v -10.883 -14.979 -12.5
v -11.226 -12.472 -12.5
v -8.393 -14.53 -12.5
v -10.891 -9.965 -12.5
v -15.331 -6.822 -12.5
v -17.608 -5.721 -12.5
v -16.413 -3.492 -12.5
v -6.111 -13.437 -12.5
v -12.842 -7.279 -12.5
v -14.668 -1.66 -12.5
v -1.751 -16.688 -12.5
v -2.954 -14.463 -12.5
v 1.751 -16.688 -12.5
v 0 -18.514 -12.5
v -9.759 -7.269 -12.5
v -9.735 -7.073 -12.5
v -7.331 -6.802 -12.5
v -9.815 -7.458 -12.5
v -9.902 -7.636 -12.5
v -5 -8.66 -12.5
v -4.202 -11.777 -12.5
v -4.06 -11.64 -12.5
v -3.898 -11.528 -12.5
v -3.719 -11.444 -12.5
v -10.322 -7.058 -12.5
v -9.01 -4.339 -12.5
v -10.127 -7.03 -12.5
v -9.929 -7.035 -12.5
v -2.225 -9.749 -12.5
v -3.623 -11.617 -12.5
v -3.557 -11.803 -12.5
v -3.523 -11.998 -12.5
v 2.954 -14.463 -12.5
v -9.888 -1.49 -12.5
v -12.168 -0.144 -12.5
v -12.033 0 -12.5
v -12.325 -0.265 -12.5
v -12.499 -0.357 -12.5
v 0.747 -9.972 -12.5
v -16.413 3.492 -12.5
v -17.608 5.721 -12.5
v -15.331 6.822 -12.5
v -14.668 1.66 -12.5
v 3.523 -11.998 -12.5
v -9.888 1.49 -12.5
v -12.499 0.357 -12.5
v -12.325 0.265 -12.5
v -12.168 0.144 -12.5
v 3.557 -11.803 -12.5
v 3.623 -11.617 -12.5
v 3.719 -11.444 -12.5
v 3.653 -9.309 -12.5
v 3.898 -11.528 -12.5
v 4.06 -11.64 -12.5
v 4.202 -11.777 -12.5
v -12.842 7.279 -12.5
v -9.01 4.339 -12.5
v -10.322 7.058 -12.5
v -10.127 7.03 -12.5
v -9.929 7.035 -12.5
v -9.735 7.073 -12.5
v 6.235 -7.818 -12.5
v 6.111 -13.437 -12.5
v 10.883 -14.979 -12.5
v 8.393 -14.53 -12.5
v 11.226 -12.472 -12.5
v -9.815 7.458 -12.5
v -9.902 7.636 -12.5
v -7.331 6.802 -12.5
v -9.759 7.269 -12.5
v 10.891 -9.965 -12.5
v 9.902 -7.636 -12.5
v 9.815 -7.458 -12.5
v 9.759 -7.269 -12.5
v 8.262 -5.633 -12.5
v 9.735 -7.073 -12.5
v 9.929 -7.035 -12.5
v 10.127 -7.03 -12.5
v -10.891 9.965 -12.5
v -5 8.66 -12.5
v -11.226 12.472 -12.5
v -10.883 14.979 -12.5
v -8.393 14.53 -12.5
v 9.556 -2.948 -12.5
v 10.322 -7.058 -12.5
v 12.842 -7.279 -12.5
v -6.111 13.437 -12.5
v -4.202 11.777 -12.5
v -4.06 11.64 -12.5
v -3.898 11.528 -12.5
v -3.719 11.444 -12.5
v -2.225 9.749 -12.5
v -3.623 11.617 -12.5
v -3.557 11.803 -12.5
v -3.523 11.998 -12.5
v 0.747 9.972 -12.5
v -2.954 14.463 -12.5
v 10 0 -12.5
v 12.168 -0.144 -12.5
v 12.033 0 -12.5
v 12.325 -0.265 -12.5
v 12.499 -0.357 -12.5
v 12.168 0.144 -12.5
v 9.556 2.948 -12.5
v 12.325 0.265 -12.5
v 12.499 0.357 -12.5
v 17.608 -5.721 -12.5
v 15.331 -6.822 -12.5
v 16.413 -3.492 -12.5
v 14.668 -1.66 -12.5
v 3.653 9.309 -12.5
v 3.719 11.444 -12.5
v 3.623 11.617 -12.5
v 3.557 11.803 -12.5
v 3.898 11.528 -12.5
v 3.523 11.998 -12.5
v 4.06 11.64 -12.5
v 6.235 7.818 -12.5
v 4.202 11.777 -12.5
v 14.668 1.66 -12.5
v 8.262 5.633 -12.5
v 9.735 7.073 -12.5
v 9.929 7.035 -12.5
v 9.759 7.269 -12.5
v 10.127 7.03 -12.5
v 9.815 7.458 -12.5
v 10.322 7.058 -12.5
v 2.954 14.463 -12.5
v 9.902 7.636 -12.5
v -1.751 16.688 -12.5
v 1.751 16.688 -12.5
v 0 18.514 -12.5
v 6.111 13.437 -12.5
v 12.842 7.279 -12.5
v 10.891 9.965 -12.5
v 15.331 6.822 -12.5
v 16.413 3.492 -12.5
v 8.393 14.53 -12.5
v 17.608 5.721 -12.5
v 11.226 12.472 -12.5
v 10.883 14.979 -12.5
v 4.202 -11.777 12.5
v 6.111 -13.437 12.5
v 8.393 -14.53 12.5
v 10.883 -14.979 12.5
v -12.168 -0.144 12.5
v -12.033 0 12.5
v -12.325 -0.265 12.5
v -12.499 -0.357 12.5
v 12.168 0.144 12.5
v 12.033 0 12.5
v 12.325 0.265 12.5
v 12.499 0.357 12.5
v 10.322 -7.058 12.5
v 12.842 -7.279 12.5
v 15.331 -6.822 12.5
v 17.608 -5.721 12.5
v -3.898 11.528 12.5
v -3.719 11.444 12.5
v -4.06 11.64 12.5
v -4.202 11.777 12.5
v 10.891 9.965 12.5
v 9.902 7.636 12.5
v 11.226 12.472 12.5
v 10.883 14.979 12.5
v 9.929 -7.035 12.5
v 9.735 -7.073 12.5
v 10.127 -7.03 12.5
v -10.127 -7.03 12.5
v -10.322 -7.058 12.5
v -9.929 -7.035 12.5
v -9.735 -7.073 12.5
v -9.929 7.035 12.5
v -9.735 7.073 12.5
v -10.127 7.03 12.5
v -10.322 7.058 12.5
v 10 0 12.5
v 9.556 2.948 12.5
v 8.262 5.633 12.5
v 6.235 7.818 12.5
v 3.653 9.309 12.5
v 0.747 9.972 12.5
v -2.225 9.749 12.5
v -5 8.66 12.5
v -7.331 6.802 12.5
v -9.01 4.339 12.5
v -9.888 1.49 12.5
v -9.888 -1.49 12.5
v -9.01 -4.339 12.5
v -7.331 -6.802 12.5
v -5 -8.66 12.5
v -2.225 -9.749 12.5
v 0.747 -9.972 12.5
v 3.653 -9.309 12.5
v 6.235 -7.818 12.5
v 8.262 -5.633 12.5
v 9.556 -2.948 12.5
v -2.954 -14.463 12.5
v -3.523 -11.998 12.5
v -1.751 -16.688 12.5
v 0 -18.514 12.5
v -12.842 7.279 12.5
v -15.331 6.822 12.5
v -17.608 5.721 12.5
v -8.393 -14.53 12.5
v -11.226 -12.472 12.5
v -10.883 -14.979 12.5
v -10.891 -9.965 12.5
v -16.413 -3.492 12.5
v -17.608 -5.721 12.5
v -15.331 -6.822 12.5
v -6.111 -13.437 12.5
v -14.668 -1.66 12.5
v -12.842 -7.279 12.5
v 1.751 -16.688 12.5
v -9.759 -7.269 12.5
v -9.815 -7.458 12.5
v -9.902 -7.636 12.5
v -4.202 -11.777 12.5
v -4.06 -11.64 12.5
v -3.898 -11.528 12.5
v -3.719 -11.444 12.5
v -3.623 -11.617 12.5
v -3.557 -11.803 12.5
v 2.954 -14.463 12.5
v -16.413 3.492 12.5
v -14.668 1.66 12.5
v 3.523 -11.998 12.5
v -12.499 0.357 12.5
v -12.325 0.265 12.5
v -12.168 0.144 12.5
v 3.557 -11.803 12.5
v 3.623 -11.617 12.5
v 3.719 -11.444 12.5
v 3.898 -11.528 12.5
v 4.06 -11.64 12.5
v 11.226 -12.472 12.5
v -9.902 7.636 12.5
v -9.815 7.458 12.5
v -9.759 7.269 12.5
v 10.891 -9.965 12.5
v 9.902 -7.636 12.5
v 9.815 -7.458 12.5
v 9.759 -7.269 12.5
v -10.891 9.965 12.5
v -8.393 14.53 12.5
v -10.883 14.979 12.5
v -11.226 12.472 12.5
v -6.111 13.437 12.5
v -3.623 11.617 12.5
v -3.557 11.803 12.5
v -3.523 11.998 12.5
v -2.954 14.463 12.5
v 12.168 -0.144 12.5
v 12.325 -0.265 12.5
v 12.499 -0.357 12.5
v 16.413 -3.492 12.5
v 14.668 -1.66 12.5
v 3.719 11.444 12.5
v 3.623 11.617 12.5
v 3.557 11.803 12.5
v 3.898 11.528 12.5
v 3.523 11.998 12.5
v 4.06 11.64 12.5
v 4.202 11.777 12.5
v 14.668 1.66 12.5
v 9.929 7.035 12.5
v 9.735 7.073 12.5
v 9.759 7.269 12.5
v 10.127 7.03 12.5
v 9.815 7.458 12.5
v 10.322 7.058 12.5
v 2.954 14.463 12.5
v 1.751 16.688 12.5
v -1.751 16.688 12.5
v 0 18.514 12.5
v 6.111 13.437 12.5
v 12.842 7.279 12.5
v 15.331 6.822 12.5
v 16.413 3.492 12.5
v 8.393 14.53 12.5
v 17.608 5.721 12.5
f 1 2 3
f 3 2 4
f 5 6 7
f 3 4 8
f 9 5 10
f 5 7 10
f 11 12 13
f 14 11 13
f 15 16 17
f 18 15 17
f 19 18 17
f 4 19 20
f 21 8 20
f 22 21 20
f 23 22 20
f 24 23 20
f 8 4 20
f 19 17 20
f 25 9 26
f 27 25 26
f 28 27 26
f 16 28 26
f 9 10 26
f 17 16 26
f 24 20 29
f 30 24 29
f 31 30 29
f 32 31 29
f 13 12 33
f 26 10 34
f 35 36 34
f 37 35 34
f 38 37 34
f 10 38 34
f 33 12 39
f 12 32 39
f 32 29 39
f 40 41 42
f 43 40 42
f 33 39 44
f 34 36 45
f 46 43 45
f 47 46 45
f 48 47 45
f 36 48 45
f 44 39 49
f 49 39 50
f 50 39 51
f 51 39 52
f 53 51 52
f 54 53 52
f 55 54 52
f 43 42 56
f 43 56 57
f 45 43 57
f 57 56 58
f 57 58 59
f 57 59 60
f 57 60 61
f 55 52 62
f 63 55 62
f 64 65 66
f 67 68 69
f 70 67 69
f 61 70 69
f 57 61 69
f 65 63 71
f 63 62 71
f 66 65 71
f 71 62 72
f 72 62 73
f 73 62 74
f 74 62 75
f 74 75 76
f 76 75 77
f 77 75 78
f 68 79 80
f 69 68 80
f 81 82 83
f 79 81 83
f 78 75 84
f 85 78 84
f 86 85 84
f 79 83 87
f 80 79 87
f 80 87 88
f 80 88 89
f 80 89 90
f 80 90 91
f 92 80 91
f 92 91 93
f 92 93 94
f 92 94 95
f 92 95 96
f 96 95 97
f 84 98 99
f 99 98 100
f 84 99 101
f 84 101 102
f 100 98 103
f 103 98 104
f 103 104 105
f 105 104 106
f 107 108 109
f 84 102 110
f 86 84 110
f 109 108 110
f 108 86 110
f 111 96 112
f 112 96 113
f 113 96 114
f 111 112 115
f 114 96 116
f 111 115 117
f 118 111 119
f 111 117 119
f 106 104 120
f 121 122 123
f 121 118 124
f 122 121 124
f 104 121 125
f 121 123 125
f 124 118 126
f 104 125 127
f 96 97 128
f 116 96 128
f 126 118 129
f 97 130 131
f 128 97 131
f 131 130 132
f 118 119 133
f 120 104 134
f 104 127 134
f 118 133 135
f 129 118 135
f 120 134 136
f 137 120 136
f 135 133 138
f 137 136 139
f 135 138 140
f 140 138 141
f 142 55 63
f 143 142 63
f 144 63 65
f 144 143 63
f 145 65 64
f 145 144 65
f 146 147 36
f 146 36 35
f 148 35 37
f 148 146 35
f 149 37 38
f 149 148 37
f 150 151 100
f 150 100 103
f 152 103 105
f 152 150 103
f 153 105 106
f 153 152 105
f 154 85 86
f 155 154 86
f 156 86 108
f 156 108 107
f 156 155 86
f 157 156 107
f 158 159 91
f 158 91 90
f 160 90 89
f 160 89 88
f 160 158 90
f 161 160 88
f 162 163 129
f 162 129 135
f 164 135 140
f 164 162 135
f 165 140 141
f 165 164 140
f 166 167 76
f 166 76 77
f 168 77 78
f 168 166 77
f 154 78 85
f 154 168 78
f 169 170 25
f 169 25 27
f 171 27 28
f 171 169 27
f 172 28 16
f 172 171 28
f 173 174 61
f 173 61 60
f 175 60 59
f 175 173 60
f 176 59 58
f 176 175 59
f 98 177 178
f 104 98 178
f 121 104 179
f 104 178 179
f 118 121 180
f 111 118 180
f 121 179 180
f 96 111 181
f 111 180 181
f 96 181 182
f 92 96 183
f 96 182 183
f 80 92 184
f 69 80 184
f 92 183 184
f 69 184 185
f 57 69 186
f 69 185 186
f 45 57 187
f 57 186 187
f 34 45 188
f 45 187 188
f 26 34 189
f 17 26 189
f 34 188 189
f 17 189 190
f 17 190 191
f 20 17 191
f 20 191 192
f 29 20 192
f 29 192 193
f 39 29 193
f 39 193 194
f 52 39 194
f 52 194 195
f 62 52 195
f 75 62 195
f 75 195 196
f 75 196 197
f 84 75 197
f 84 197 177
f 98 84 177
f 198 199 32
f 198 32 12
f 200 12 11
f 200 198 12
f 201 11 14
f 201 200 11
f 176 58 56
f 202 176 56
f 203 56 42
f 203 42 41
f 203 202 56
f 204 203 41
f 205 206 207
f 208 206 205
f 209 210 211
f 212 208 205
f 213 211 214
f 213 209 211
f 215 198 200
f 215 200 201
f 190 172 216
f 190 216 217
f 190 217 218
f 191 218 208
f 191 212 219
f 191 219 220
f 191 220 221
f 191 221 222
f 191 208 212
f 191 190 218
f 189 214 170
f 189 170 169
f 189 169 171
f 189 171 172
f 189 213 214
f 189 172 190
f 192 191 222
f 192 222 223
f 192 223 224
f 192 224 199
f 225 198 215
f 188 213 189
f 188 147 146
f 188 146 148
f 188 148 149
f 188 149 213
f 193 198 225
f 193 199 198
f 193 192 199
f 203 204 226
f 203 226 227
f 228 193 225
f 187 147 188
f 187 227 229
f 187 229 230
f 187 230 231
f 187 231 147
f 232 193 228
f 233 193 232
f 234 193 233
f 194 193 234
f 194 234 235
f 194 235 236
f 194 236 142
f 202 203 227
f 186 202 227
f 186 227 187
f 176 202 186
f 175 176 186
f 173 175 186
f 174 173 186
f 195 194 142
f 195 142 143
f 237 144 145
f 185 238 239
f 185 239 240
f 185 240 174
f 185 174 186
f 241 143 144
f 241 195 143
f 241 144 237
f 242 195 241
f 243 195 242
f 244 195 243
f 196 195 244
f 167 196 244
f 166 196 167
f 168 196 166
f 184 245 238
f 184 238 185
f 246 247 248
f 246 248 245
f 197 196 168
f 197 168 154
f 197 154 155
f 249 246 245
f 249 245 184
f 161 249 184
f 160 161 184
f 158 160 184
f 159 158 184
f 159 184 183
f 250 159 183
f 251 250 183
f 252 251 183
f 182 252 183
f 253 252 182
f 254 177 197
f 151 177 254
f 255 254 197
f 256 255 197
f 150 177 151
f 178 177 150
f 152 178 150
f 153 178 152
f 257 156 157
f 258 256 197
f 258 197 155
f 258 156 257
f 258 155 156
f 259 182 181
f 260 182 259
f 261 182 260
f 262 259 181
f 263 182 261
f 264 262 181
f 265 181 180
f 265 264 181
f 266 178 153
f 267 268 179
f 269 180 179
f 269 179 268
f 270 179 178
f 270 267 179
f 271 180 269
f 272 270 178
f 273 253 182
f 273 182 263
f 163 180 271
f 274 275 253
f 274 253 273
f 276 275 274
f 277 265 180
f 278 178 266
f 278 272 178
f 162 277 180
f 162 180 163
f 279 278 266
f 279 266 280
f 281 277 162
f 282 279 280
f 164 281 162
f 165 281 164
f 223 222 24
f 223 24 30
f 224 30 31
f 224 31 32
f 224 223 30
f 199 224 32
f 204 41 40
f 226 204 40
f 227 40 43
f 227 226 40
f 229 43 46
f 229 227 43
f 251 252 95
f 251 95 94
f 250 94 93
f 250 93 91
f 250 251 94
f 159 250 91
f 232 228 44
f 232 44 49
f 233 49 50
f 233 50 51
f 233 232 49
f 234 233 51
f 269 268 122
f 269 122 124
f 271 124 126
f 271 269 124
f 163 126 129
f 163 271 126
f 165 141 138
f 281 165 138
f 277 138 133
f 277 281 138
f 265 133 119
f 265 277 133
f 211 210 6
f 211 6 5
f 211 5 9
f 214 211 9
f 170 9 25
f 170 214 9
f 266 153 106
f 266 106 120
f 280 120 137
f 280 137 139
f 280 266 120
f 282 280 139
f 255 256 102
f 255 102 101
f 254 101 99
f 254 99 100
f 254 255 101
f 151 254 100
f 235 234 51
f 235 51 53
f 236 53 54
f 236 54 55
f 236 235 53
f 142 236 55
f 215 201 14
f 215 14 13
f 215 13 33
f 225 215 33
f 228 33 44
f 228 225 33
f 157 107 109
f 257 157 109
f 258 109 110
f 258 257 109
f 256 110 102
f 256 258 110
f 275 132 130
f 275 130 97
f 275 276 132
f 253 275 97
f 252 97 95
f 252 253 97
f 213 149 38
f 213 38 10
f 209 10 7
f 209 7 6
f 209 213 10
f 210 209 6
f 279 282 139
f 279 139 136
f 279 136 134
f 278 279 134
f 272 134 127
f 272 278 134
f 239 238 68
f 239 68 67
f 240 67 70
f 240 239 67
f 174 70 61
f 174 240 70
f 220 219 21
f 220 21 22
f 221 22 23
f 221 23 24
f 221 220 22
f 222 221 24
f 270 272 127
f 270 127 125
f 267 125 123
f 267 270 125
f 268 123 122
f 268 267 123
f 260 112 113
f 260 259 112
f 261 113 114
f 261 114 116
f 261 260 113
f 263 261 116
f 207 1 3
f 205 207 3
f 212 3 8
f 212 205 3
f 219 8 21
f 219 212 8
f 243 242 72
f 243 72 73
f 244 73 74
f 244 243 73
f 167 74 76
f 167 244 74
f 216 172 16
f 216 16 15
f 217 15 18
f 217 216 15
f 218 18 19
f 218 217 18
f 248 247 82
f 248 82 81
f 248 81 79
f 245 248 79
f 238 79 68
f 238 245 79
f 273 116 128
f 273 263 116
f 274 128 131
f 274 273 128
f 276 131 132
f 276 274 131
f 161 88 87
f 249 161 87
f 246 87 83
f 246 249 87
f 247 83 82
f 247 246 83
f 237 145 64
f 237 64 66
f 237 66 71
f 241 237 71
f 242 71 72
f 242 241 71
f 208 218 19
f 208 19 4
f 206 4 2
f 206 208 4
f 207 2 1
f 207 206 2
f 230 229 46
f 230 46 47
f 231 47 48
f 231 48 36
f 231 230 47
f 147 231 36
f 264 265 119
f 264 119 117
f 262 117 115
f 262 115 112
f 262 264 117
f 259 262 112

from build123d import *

# Parameters (mm, degrees)
BOSS_EXTRUDE1_DEPTH = 12.5
SKETCH2_R           = 10
CUT_EXTRUDE1_DEPTH  = 36.746855524


with BuildPart() as part:
    # Sketch1 → Boss-Extrude1 (new, symmetric)
    with BuildSketch(Plane.XY):
        with BuildLine():
            ThreePointArc((0, 18.51446423), (-2.427307325, 15.616232504), (-3.522517853, 11.9979343))
            ThreePointArc((-3.522517853, 11.9979343), (-3.586020803, 11.708984719), (-3.718536081, 11.444477279))
            ThreePointArc((-3.718536081, 11.444477279), (-3.981216766, 11.580577767), (-4.202432033, 11.777016791))
            ThreePointArc((-4.202432033, 11.777016791), (-7.215258285, 14.060532932), (-10.882529029, 14.978516204))
            ThreePointArc((-10.882529029, 14.978516204), (-11.142724039, 11.207062035), (-9.901985646, 7.636048701))
            ThreePointArc((-9.901985646, 7.636048701), (-9.783520309, 7.364957483), (-9.735253849, 7.073075942))
            ThreePointArc((-9.735253849, 7.073075942), (-10.027764846, 7.028783717), (-10.322195719, 7.057679154))
            ThreePointArc((-10.322195719, 7.057679154), (-14.101840469, 7.13418768), (-17.608301852, 5.721284089))
            ThreePointArc((-17.608301852, 5.721284089), (-15.601998897, 2.517174783), (-12.499231478, 0.357452038))
            ThreePointArc((-12.499231478, 0.357452038), (-12.244047587, 0.207766813), (-12.033435535, 0))
            ThreePointArc((-12.033435535, 0), (-12.244047587, -0.207766813), (-12.499231478, -0.357452038))
            ThreePointArc((-12.499231478, -0.357452038), (-15.601998897, -2.517174783), (-17.608301852, -5.721284089))
            ThreePointArc((-17.608301852, -5.721284089), (-14.101840469, -7.13418768), (-10.322195719, -7.057679154))
            ThreePointArc((-10.322195719, -7.057679154), (-10.027764846, -7.028783717), (-9.735253849, -7.073075942))
            ThreePointArc((-9.735253849, -7.073075942), (-9.783520309, -7.364957483), (-9.901985646, -7.636048701))
            ThreePointArc((-9.901985646, -7.636048701), (-11.142724039, -11.207062035), (-10.882529029, -14.978516204))
            ThreePointArc((-10.882529029, -14.978516204), (-7.215258285, -14.060532932), (-4.202432033, -11.777016791))
            ThreePointArc((-4.202432033, -11.777016791), (-3.981216766, -11.580577767), (-3.718536081, -11.444477279))
            ThreePointArc((-3.718536081, -11.444477279), (-3.586020803, -11.708984719), (-3.522517853, -11.9979343))
            ThreePointArc((-3.522517853, -11.9979343), (-2.427307325, -15.616232504), (0, -18.51446423))
            ThreePointArc((0, -18.51446423), (2.427307325, -15.616232504), (3.522517853, -11.9979343))
            ThreePointArc((3.522517853, -11.9979343), (3.586020803, -11.708984719), (3.718536081, -11.444477279))
            ThreePointArc((3.718536081, -11.444477279), (3.981216766, -11.580577767), (4.202432033, -11.777016791))
            ThreePointArc((4.202432033, -11.777016791), (7.215258285, -14.060532932), (10.882529029, -14.978516204))
            ThreePointArc((10.882529029, -14.978516204), (11.142724039, -11.207062035), (9.901985646, -7.636048701))
            ThreePointArc((9.901985646, -7.636048701), (9.783520309, -7.364957483), (9.735253849, -7.073075942))
            ThreePointArc((9.735253849, -7.073075942), (10.027764846, -7.028783717), (10.322195719, -7.057679154))
            ThreePointArc((10.322195719, -7.057679154), (14.101840469, -7.13418768), (17.608301852, -5.721284089))
            ThreePointArc((17.608301852, -5.721284089), (15.601998897, -2.517174783), (12.499231478, -0.357452038))
            ThreePointArc((12.499231478, -0.357452038), (12.244047587, -0.207766813), (12.033435535, 0))
            ThreePointArc((12.033435535, 0), (12.244047587, 0.207766813), (12.499231478, 0.357452038))
            ThreePointArc((12.499231478, 0.357452038), (15.601998897, 2.517174783), (17.608301852, 5.721284089))
            ThreePointArc((17.608301852, 5.721284089), (14.101840469, 7.13418768), (10.322195719, 7.057679154))
            ThreePointArc((10.322195719, 7.057679154), (10.027764846, 7.028783717), (9.735253849, 7.073075942))
            ThreePointArc((9.735253849, 7.073075942), (9.783520309, 7.364957483), (9.901985646, 7.636048701))
            ThreePointArc((9.901985646, 7.636048701), (11.142724039, 11.207062035), (10.882529029, 14.978516204))
            ThreePointArc((10.882529029, 14.978516204), (7.215258285, 14.060532932), (4.202432033, 11.777016791))
            ThreePointArc((4.202432033, 11.777016791), (3.981216766, 11.580577767), (3.718536081, 11.444477279))
            ThreePointArc((3.718536081, 11.444477279), (3.586020803, 11.708984719), (3.522517853, 11.9979343))
            ThreePointArc((3.522517853, 11.9979343), (2.427307325, 15.616232504), (0, 18.51446423))
        make_face()
    extrude(amount=BOSS_EXTRUDE1_DEPTH, both=True)

    # Sketch2 → Cut-Extrude1 (cut, through all)
    with BuildSketch(Plane.XY.offset(12.5)):
        Circle(SKETCH2_R)
    extrude(amount=-CUT_EXTRUDE1_DEPTH, mode=Mode.SUBTRACT)


solid = part.part
